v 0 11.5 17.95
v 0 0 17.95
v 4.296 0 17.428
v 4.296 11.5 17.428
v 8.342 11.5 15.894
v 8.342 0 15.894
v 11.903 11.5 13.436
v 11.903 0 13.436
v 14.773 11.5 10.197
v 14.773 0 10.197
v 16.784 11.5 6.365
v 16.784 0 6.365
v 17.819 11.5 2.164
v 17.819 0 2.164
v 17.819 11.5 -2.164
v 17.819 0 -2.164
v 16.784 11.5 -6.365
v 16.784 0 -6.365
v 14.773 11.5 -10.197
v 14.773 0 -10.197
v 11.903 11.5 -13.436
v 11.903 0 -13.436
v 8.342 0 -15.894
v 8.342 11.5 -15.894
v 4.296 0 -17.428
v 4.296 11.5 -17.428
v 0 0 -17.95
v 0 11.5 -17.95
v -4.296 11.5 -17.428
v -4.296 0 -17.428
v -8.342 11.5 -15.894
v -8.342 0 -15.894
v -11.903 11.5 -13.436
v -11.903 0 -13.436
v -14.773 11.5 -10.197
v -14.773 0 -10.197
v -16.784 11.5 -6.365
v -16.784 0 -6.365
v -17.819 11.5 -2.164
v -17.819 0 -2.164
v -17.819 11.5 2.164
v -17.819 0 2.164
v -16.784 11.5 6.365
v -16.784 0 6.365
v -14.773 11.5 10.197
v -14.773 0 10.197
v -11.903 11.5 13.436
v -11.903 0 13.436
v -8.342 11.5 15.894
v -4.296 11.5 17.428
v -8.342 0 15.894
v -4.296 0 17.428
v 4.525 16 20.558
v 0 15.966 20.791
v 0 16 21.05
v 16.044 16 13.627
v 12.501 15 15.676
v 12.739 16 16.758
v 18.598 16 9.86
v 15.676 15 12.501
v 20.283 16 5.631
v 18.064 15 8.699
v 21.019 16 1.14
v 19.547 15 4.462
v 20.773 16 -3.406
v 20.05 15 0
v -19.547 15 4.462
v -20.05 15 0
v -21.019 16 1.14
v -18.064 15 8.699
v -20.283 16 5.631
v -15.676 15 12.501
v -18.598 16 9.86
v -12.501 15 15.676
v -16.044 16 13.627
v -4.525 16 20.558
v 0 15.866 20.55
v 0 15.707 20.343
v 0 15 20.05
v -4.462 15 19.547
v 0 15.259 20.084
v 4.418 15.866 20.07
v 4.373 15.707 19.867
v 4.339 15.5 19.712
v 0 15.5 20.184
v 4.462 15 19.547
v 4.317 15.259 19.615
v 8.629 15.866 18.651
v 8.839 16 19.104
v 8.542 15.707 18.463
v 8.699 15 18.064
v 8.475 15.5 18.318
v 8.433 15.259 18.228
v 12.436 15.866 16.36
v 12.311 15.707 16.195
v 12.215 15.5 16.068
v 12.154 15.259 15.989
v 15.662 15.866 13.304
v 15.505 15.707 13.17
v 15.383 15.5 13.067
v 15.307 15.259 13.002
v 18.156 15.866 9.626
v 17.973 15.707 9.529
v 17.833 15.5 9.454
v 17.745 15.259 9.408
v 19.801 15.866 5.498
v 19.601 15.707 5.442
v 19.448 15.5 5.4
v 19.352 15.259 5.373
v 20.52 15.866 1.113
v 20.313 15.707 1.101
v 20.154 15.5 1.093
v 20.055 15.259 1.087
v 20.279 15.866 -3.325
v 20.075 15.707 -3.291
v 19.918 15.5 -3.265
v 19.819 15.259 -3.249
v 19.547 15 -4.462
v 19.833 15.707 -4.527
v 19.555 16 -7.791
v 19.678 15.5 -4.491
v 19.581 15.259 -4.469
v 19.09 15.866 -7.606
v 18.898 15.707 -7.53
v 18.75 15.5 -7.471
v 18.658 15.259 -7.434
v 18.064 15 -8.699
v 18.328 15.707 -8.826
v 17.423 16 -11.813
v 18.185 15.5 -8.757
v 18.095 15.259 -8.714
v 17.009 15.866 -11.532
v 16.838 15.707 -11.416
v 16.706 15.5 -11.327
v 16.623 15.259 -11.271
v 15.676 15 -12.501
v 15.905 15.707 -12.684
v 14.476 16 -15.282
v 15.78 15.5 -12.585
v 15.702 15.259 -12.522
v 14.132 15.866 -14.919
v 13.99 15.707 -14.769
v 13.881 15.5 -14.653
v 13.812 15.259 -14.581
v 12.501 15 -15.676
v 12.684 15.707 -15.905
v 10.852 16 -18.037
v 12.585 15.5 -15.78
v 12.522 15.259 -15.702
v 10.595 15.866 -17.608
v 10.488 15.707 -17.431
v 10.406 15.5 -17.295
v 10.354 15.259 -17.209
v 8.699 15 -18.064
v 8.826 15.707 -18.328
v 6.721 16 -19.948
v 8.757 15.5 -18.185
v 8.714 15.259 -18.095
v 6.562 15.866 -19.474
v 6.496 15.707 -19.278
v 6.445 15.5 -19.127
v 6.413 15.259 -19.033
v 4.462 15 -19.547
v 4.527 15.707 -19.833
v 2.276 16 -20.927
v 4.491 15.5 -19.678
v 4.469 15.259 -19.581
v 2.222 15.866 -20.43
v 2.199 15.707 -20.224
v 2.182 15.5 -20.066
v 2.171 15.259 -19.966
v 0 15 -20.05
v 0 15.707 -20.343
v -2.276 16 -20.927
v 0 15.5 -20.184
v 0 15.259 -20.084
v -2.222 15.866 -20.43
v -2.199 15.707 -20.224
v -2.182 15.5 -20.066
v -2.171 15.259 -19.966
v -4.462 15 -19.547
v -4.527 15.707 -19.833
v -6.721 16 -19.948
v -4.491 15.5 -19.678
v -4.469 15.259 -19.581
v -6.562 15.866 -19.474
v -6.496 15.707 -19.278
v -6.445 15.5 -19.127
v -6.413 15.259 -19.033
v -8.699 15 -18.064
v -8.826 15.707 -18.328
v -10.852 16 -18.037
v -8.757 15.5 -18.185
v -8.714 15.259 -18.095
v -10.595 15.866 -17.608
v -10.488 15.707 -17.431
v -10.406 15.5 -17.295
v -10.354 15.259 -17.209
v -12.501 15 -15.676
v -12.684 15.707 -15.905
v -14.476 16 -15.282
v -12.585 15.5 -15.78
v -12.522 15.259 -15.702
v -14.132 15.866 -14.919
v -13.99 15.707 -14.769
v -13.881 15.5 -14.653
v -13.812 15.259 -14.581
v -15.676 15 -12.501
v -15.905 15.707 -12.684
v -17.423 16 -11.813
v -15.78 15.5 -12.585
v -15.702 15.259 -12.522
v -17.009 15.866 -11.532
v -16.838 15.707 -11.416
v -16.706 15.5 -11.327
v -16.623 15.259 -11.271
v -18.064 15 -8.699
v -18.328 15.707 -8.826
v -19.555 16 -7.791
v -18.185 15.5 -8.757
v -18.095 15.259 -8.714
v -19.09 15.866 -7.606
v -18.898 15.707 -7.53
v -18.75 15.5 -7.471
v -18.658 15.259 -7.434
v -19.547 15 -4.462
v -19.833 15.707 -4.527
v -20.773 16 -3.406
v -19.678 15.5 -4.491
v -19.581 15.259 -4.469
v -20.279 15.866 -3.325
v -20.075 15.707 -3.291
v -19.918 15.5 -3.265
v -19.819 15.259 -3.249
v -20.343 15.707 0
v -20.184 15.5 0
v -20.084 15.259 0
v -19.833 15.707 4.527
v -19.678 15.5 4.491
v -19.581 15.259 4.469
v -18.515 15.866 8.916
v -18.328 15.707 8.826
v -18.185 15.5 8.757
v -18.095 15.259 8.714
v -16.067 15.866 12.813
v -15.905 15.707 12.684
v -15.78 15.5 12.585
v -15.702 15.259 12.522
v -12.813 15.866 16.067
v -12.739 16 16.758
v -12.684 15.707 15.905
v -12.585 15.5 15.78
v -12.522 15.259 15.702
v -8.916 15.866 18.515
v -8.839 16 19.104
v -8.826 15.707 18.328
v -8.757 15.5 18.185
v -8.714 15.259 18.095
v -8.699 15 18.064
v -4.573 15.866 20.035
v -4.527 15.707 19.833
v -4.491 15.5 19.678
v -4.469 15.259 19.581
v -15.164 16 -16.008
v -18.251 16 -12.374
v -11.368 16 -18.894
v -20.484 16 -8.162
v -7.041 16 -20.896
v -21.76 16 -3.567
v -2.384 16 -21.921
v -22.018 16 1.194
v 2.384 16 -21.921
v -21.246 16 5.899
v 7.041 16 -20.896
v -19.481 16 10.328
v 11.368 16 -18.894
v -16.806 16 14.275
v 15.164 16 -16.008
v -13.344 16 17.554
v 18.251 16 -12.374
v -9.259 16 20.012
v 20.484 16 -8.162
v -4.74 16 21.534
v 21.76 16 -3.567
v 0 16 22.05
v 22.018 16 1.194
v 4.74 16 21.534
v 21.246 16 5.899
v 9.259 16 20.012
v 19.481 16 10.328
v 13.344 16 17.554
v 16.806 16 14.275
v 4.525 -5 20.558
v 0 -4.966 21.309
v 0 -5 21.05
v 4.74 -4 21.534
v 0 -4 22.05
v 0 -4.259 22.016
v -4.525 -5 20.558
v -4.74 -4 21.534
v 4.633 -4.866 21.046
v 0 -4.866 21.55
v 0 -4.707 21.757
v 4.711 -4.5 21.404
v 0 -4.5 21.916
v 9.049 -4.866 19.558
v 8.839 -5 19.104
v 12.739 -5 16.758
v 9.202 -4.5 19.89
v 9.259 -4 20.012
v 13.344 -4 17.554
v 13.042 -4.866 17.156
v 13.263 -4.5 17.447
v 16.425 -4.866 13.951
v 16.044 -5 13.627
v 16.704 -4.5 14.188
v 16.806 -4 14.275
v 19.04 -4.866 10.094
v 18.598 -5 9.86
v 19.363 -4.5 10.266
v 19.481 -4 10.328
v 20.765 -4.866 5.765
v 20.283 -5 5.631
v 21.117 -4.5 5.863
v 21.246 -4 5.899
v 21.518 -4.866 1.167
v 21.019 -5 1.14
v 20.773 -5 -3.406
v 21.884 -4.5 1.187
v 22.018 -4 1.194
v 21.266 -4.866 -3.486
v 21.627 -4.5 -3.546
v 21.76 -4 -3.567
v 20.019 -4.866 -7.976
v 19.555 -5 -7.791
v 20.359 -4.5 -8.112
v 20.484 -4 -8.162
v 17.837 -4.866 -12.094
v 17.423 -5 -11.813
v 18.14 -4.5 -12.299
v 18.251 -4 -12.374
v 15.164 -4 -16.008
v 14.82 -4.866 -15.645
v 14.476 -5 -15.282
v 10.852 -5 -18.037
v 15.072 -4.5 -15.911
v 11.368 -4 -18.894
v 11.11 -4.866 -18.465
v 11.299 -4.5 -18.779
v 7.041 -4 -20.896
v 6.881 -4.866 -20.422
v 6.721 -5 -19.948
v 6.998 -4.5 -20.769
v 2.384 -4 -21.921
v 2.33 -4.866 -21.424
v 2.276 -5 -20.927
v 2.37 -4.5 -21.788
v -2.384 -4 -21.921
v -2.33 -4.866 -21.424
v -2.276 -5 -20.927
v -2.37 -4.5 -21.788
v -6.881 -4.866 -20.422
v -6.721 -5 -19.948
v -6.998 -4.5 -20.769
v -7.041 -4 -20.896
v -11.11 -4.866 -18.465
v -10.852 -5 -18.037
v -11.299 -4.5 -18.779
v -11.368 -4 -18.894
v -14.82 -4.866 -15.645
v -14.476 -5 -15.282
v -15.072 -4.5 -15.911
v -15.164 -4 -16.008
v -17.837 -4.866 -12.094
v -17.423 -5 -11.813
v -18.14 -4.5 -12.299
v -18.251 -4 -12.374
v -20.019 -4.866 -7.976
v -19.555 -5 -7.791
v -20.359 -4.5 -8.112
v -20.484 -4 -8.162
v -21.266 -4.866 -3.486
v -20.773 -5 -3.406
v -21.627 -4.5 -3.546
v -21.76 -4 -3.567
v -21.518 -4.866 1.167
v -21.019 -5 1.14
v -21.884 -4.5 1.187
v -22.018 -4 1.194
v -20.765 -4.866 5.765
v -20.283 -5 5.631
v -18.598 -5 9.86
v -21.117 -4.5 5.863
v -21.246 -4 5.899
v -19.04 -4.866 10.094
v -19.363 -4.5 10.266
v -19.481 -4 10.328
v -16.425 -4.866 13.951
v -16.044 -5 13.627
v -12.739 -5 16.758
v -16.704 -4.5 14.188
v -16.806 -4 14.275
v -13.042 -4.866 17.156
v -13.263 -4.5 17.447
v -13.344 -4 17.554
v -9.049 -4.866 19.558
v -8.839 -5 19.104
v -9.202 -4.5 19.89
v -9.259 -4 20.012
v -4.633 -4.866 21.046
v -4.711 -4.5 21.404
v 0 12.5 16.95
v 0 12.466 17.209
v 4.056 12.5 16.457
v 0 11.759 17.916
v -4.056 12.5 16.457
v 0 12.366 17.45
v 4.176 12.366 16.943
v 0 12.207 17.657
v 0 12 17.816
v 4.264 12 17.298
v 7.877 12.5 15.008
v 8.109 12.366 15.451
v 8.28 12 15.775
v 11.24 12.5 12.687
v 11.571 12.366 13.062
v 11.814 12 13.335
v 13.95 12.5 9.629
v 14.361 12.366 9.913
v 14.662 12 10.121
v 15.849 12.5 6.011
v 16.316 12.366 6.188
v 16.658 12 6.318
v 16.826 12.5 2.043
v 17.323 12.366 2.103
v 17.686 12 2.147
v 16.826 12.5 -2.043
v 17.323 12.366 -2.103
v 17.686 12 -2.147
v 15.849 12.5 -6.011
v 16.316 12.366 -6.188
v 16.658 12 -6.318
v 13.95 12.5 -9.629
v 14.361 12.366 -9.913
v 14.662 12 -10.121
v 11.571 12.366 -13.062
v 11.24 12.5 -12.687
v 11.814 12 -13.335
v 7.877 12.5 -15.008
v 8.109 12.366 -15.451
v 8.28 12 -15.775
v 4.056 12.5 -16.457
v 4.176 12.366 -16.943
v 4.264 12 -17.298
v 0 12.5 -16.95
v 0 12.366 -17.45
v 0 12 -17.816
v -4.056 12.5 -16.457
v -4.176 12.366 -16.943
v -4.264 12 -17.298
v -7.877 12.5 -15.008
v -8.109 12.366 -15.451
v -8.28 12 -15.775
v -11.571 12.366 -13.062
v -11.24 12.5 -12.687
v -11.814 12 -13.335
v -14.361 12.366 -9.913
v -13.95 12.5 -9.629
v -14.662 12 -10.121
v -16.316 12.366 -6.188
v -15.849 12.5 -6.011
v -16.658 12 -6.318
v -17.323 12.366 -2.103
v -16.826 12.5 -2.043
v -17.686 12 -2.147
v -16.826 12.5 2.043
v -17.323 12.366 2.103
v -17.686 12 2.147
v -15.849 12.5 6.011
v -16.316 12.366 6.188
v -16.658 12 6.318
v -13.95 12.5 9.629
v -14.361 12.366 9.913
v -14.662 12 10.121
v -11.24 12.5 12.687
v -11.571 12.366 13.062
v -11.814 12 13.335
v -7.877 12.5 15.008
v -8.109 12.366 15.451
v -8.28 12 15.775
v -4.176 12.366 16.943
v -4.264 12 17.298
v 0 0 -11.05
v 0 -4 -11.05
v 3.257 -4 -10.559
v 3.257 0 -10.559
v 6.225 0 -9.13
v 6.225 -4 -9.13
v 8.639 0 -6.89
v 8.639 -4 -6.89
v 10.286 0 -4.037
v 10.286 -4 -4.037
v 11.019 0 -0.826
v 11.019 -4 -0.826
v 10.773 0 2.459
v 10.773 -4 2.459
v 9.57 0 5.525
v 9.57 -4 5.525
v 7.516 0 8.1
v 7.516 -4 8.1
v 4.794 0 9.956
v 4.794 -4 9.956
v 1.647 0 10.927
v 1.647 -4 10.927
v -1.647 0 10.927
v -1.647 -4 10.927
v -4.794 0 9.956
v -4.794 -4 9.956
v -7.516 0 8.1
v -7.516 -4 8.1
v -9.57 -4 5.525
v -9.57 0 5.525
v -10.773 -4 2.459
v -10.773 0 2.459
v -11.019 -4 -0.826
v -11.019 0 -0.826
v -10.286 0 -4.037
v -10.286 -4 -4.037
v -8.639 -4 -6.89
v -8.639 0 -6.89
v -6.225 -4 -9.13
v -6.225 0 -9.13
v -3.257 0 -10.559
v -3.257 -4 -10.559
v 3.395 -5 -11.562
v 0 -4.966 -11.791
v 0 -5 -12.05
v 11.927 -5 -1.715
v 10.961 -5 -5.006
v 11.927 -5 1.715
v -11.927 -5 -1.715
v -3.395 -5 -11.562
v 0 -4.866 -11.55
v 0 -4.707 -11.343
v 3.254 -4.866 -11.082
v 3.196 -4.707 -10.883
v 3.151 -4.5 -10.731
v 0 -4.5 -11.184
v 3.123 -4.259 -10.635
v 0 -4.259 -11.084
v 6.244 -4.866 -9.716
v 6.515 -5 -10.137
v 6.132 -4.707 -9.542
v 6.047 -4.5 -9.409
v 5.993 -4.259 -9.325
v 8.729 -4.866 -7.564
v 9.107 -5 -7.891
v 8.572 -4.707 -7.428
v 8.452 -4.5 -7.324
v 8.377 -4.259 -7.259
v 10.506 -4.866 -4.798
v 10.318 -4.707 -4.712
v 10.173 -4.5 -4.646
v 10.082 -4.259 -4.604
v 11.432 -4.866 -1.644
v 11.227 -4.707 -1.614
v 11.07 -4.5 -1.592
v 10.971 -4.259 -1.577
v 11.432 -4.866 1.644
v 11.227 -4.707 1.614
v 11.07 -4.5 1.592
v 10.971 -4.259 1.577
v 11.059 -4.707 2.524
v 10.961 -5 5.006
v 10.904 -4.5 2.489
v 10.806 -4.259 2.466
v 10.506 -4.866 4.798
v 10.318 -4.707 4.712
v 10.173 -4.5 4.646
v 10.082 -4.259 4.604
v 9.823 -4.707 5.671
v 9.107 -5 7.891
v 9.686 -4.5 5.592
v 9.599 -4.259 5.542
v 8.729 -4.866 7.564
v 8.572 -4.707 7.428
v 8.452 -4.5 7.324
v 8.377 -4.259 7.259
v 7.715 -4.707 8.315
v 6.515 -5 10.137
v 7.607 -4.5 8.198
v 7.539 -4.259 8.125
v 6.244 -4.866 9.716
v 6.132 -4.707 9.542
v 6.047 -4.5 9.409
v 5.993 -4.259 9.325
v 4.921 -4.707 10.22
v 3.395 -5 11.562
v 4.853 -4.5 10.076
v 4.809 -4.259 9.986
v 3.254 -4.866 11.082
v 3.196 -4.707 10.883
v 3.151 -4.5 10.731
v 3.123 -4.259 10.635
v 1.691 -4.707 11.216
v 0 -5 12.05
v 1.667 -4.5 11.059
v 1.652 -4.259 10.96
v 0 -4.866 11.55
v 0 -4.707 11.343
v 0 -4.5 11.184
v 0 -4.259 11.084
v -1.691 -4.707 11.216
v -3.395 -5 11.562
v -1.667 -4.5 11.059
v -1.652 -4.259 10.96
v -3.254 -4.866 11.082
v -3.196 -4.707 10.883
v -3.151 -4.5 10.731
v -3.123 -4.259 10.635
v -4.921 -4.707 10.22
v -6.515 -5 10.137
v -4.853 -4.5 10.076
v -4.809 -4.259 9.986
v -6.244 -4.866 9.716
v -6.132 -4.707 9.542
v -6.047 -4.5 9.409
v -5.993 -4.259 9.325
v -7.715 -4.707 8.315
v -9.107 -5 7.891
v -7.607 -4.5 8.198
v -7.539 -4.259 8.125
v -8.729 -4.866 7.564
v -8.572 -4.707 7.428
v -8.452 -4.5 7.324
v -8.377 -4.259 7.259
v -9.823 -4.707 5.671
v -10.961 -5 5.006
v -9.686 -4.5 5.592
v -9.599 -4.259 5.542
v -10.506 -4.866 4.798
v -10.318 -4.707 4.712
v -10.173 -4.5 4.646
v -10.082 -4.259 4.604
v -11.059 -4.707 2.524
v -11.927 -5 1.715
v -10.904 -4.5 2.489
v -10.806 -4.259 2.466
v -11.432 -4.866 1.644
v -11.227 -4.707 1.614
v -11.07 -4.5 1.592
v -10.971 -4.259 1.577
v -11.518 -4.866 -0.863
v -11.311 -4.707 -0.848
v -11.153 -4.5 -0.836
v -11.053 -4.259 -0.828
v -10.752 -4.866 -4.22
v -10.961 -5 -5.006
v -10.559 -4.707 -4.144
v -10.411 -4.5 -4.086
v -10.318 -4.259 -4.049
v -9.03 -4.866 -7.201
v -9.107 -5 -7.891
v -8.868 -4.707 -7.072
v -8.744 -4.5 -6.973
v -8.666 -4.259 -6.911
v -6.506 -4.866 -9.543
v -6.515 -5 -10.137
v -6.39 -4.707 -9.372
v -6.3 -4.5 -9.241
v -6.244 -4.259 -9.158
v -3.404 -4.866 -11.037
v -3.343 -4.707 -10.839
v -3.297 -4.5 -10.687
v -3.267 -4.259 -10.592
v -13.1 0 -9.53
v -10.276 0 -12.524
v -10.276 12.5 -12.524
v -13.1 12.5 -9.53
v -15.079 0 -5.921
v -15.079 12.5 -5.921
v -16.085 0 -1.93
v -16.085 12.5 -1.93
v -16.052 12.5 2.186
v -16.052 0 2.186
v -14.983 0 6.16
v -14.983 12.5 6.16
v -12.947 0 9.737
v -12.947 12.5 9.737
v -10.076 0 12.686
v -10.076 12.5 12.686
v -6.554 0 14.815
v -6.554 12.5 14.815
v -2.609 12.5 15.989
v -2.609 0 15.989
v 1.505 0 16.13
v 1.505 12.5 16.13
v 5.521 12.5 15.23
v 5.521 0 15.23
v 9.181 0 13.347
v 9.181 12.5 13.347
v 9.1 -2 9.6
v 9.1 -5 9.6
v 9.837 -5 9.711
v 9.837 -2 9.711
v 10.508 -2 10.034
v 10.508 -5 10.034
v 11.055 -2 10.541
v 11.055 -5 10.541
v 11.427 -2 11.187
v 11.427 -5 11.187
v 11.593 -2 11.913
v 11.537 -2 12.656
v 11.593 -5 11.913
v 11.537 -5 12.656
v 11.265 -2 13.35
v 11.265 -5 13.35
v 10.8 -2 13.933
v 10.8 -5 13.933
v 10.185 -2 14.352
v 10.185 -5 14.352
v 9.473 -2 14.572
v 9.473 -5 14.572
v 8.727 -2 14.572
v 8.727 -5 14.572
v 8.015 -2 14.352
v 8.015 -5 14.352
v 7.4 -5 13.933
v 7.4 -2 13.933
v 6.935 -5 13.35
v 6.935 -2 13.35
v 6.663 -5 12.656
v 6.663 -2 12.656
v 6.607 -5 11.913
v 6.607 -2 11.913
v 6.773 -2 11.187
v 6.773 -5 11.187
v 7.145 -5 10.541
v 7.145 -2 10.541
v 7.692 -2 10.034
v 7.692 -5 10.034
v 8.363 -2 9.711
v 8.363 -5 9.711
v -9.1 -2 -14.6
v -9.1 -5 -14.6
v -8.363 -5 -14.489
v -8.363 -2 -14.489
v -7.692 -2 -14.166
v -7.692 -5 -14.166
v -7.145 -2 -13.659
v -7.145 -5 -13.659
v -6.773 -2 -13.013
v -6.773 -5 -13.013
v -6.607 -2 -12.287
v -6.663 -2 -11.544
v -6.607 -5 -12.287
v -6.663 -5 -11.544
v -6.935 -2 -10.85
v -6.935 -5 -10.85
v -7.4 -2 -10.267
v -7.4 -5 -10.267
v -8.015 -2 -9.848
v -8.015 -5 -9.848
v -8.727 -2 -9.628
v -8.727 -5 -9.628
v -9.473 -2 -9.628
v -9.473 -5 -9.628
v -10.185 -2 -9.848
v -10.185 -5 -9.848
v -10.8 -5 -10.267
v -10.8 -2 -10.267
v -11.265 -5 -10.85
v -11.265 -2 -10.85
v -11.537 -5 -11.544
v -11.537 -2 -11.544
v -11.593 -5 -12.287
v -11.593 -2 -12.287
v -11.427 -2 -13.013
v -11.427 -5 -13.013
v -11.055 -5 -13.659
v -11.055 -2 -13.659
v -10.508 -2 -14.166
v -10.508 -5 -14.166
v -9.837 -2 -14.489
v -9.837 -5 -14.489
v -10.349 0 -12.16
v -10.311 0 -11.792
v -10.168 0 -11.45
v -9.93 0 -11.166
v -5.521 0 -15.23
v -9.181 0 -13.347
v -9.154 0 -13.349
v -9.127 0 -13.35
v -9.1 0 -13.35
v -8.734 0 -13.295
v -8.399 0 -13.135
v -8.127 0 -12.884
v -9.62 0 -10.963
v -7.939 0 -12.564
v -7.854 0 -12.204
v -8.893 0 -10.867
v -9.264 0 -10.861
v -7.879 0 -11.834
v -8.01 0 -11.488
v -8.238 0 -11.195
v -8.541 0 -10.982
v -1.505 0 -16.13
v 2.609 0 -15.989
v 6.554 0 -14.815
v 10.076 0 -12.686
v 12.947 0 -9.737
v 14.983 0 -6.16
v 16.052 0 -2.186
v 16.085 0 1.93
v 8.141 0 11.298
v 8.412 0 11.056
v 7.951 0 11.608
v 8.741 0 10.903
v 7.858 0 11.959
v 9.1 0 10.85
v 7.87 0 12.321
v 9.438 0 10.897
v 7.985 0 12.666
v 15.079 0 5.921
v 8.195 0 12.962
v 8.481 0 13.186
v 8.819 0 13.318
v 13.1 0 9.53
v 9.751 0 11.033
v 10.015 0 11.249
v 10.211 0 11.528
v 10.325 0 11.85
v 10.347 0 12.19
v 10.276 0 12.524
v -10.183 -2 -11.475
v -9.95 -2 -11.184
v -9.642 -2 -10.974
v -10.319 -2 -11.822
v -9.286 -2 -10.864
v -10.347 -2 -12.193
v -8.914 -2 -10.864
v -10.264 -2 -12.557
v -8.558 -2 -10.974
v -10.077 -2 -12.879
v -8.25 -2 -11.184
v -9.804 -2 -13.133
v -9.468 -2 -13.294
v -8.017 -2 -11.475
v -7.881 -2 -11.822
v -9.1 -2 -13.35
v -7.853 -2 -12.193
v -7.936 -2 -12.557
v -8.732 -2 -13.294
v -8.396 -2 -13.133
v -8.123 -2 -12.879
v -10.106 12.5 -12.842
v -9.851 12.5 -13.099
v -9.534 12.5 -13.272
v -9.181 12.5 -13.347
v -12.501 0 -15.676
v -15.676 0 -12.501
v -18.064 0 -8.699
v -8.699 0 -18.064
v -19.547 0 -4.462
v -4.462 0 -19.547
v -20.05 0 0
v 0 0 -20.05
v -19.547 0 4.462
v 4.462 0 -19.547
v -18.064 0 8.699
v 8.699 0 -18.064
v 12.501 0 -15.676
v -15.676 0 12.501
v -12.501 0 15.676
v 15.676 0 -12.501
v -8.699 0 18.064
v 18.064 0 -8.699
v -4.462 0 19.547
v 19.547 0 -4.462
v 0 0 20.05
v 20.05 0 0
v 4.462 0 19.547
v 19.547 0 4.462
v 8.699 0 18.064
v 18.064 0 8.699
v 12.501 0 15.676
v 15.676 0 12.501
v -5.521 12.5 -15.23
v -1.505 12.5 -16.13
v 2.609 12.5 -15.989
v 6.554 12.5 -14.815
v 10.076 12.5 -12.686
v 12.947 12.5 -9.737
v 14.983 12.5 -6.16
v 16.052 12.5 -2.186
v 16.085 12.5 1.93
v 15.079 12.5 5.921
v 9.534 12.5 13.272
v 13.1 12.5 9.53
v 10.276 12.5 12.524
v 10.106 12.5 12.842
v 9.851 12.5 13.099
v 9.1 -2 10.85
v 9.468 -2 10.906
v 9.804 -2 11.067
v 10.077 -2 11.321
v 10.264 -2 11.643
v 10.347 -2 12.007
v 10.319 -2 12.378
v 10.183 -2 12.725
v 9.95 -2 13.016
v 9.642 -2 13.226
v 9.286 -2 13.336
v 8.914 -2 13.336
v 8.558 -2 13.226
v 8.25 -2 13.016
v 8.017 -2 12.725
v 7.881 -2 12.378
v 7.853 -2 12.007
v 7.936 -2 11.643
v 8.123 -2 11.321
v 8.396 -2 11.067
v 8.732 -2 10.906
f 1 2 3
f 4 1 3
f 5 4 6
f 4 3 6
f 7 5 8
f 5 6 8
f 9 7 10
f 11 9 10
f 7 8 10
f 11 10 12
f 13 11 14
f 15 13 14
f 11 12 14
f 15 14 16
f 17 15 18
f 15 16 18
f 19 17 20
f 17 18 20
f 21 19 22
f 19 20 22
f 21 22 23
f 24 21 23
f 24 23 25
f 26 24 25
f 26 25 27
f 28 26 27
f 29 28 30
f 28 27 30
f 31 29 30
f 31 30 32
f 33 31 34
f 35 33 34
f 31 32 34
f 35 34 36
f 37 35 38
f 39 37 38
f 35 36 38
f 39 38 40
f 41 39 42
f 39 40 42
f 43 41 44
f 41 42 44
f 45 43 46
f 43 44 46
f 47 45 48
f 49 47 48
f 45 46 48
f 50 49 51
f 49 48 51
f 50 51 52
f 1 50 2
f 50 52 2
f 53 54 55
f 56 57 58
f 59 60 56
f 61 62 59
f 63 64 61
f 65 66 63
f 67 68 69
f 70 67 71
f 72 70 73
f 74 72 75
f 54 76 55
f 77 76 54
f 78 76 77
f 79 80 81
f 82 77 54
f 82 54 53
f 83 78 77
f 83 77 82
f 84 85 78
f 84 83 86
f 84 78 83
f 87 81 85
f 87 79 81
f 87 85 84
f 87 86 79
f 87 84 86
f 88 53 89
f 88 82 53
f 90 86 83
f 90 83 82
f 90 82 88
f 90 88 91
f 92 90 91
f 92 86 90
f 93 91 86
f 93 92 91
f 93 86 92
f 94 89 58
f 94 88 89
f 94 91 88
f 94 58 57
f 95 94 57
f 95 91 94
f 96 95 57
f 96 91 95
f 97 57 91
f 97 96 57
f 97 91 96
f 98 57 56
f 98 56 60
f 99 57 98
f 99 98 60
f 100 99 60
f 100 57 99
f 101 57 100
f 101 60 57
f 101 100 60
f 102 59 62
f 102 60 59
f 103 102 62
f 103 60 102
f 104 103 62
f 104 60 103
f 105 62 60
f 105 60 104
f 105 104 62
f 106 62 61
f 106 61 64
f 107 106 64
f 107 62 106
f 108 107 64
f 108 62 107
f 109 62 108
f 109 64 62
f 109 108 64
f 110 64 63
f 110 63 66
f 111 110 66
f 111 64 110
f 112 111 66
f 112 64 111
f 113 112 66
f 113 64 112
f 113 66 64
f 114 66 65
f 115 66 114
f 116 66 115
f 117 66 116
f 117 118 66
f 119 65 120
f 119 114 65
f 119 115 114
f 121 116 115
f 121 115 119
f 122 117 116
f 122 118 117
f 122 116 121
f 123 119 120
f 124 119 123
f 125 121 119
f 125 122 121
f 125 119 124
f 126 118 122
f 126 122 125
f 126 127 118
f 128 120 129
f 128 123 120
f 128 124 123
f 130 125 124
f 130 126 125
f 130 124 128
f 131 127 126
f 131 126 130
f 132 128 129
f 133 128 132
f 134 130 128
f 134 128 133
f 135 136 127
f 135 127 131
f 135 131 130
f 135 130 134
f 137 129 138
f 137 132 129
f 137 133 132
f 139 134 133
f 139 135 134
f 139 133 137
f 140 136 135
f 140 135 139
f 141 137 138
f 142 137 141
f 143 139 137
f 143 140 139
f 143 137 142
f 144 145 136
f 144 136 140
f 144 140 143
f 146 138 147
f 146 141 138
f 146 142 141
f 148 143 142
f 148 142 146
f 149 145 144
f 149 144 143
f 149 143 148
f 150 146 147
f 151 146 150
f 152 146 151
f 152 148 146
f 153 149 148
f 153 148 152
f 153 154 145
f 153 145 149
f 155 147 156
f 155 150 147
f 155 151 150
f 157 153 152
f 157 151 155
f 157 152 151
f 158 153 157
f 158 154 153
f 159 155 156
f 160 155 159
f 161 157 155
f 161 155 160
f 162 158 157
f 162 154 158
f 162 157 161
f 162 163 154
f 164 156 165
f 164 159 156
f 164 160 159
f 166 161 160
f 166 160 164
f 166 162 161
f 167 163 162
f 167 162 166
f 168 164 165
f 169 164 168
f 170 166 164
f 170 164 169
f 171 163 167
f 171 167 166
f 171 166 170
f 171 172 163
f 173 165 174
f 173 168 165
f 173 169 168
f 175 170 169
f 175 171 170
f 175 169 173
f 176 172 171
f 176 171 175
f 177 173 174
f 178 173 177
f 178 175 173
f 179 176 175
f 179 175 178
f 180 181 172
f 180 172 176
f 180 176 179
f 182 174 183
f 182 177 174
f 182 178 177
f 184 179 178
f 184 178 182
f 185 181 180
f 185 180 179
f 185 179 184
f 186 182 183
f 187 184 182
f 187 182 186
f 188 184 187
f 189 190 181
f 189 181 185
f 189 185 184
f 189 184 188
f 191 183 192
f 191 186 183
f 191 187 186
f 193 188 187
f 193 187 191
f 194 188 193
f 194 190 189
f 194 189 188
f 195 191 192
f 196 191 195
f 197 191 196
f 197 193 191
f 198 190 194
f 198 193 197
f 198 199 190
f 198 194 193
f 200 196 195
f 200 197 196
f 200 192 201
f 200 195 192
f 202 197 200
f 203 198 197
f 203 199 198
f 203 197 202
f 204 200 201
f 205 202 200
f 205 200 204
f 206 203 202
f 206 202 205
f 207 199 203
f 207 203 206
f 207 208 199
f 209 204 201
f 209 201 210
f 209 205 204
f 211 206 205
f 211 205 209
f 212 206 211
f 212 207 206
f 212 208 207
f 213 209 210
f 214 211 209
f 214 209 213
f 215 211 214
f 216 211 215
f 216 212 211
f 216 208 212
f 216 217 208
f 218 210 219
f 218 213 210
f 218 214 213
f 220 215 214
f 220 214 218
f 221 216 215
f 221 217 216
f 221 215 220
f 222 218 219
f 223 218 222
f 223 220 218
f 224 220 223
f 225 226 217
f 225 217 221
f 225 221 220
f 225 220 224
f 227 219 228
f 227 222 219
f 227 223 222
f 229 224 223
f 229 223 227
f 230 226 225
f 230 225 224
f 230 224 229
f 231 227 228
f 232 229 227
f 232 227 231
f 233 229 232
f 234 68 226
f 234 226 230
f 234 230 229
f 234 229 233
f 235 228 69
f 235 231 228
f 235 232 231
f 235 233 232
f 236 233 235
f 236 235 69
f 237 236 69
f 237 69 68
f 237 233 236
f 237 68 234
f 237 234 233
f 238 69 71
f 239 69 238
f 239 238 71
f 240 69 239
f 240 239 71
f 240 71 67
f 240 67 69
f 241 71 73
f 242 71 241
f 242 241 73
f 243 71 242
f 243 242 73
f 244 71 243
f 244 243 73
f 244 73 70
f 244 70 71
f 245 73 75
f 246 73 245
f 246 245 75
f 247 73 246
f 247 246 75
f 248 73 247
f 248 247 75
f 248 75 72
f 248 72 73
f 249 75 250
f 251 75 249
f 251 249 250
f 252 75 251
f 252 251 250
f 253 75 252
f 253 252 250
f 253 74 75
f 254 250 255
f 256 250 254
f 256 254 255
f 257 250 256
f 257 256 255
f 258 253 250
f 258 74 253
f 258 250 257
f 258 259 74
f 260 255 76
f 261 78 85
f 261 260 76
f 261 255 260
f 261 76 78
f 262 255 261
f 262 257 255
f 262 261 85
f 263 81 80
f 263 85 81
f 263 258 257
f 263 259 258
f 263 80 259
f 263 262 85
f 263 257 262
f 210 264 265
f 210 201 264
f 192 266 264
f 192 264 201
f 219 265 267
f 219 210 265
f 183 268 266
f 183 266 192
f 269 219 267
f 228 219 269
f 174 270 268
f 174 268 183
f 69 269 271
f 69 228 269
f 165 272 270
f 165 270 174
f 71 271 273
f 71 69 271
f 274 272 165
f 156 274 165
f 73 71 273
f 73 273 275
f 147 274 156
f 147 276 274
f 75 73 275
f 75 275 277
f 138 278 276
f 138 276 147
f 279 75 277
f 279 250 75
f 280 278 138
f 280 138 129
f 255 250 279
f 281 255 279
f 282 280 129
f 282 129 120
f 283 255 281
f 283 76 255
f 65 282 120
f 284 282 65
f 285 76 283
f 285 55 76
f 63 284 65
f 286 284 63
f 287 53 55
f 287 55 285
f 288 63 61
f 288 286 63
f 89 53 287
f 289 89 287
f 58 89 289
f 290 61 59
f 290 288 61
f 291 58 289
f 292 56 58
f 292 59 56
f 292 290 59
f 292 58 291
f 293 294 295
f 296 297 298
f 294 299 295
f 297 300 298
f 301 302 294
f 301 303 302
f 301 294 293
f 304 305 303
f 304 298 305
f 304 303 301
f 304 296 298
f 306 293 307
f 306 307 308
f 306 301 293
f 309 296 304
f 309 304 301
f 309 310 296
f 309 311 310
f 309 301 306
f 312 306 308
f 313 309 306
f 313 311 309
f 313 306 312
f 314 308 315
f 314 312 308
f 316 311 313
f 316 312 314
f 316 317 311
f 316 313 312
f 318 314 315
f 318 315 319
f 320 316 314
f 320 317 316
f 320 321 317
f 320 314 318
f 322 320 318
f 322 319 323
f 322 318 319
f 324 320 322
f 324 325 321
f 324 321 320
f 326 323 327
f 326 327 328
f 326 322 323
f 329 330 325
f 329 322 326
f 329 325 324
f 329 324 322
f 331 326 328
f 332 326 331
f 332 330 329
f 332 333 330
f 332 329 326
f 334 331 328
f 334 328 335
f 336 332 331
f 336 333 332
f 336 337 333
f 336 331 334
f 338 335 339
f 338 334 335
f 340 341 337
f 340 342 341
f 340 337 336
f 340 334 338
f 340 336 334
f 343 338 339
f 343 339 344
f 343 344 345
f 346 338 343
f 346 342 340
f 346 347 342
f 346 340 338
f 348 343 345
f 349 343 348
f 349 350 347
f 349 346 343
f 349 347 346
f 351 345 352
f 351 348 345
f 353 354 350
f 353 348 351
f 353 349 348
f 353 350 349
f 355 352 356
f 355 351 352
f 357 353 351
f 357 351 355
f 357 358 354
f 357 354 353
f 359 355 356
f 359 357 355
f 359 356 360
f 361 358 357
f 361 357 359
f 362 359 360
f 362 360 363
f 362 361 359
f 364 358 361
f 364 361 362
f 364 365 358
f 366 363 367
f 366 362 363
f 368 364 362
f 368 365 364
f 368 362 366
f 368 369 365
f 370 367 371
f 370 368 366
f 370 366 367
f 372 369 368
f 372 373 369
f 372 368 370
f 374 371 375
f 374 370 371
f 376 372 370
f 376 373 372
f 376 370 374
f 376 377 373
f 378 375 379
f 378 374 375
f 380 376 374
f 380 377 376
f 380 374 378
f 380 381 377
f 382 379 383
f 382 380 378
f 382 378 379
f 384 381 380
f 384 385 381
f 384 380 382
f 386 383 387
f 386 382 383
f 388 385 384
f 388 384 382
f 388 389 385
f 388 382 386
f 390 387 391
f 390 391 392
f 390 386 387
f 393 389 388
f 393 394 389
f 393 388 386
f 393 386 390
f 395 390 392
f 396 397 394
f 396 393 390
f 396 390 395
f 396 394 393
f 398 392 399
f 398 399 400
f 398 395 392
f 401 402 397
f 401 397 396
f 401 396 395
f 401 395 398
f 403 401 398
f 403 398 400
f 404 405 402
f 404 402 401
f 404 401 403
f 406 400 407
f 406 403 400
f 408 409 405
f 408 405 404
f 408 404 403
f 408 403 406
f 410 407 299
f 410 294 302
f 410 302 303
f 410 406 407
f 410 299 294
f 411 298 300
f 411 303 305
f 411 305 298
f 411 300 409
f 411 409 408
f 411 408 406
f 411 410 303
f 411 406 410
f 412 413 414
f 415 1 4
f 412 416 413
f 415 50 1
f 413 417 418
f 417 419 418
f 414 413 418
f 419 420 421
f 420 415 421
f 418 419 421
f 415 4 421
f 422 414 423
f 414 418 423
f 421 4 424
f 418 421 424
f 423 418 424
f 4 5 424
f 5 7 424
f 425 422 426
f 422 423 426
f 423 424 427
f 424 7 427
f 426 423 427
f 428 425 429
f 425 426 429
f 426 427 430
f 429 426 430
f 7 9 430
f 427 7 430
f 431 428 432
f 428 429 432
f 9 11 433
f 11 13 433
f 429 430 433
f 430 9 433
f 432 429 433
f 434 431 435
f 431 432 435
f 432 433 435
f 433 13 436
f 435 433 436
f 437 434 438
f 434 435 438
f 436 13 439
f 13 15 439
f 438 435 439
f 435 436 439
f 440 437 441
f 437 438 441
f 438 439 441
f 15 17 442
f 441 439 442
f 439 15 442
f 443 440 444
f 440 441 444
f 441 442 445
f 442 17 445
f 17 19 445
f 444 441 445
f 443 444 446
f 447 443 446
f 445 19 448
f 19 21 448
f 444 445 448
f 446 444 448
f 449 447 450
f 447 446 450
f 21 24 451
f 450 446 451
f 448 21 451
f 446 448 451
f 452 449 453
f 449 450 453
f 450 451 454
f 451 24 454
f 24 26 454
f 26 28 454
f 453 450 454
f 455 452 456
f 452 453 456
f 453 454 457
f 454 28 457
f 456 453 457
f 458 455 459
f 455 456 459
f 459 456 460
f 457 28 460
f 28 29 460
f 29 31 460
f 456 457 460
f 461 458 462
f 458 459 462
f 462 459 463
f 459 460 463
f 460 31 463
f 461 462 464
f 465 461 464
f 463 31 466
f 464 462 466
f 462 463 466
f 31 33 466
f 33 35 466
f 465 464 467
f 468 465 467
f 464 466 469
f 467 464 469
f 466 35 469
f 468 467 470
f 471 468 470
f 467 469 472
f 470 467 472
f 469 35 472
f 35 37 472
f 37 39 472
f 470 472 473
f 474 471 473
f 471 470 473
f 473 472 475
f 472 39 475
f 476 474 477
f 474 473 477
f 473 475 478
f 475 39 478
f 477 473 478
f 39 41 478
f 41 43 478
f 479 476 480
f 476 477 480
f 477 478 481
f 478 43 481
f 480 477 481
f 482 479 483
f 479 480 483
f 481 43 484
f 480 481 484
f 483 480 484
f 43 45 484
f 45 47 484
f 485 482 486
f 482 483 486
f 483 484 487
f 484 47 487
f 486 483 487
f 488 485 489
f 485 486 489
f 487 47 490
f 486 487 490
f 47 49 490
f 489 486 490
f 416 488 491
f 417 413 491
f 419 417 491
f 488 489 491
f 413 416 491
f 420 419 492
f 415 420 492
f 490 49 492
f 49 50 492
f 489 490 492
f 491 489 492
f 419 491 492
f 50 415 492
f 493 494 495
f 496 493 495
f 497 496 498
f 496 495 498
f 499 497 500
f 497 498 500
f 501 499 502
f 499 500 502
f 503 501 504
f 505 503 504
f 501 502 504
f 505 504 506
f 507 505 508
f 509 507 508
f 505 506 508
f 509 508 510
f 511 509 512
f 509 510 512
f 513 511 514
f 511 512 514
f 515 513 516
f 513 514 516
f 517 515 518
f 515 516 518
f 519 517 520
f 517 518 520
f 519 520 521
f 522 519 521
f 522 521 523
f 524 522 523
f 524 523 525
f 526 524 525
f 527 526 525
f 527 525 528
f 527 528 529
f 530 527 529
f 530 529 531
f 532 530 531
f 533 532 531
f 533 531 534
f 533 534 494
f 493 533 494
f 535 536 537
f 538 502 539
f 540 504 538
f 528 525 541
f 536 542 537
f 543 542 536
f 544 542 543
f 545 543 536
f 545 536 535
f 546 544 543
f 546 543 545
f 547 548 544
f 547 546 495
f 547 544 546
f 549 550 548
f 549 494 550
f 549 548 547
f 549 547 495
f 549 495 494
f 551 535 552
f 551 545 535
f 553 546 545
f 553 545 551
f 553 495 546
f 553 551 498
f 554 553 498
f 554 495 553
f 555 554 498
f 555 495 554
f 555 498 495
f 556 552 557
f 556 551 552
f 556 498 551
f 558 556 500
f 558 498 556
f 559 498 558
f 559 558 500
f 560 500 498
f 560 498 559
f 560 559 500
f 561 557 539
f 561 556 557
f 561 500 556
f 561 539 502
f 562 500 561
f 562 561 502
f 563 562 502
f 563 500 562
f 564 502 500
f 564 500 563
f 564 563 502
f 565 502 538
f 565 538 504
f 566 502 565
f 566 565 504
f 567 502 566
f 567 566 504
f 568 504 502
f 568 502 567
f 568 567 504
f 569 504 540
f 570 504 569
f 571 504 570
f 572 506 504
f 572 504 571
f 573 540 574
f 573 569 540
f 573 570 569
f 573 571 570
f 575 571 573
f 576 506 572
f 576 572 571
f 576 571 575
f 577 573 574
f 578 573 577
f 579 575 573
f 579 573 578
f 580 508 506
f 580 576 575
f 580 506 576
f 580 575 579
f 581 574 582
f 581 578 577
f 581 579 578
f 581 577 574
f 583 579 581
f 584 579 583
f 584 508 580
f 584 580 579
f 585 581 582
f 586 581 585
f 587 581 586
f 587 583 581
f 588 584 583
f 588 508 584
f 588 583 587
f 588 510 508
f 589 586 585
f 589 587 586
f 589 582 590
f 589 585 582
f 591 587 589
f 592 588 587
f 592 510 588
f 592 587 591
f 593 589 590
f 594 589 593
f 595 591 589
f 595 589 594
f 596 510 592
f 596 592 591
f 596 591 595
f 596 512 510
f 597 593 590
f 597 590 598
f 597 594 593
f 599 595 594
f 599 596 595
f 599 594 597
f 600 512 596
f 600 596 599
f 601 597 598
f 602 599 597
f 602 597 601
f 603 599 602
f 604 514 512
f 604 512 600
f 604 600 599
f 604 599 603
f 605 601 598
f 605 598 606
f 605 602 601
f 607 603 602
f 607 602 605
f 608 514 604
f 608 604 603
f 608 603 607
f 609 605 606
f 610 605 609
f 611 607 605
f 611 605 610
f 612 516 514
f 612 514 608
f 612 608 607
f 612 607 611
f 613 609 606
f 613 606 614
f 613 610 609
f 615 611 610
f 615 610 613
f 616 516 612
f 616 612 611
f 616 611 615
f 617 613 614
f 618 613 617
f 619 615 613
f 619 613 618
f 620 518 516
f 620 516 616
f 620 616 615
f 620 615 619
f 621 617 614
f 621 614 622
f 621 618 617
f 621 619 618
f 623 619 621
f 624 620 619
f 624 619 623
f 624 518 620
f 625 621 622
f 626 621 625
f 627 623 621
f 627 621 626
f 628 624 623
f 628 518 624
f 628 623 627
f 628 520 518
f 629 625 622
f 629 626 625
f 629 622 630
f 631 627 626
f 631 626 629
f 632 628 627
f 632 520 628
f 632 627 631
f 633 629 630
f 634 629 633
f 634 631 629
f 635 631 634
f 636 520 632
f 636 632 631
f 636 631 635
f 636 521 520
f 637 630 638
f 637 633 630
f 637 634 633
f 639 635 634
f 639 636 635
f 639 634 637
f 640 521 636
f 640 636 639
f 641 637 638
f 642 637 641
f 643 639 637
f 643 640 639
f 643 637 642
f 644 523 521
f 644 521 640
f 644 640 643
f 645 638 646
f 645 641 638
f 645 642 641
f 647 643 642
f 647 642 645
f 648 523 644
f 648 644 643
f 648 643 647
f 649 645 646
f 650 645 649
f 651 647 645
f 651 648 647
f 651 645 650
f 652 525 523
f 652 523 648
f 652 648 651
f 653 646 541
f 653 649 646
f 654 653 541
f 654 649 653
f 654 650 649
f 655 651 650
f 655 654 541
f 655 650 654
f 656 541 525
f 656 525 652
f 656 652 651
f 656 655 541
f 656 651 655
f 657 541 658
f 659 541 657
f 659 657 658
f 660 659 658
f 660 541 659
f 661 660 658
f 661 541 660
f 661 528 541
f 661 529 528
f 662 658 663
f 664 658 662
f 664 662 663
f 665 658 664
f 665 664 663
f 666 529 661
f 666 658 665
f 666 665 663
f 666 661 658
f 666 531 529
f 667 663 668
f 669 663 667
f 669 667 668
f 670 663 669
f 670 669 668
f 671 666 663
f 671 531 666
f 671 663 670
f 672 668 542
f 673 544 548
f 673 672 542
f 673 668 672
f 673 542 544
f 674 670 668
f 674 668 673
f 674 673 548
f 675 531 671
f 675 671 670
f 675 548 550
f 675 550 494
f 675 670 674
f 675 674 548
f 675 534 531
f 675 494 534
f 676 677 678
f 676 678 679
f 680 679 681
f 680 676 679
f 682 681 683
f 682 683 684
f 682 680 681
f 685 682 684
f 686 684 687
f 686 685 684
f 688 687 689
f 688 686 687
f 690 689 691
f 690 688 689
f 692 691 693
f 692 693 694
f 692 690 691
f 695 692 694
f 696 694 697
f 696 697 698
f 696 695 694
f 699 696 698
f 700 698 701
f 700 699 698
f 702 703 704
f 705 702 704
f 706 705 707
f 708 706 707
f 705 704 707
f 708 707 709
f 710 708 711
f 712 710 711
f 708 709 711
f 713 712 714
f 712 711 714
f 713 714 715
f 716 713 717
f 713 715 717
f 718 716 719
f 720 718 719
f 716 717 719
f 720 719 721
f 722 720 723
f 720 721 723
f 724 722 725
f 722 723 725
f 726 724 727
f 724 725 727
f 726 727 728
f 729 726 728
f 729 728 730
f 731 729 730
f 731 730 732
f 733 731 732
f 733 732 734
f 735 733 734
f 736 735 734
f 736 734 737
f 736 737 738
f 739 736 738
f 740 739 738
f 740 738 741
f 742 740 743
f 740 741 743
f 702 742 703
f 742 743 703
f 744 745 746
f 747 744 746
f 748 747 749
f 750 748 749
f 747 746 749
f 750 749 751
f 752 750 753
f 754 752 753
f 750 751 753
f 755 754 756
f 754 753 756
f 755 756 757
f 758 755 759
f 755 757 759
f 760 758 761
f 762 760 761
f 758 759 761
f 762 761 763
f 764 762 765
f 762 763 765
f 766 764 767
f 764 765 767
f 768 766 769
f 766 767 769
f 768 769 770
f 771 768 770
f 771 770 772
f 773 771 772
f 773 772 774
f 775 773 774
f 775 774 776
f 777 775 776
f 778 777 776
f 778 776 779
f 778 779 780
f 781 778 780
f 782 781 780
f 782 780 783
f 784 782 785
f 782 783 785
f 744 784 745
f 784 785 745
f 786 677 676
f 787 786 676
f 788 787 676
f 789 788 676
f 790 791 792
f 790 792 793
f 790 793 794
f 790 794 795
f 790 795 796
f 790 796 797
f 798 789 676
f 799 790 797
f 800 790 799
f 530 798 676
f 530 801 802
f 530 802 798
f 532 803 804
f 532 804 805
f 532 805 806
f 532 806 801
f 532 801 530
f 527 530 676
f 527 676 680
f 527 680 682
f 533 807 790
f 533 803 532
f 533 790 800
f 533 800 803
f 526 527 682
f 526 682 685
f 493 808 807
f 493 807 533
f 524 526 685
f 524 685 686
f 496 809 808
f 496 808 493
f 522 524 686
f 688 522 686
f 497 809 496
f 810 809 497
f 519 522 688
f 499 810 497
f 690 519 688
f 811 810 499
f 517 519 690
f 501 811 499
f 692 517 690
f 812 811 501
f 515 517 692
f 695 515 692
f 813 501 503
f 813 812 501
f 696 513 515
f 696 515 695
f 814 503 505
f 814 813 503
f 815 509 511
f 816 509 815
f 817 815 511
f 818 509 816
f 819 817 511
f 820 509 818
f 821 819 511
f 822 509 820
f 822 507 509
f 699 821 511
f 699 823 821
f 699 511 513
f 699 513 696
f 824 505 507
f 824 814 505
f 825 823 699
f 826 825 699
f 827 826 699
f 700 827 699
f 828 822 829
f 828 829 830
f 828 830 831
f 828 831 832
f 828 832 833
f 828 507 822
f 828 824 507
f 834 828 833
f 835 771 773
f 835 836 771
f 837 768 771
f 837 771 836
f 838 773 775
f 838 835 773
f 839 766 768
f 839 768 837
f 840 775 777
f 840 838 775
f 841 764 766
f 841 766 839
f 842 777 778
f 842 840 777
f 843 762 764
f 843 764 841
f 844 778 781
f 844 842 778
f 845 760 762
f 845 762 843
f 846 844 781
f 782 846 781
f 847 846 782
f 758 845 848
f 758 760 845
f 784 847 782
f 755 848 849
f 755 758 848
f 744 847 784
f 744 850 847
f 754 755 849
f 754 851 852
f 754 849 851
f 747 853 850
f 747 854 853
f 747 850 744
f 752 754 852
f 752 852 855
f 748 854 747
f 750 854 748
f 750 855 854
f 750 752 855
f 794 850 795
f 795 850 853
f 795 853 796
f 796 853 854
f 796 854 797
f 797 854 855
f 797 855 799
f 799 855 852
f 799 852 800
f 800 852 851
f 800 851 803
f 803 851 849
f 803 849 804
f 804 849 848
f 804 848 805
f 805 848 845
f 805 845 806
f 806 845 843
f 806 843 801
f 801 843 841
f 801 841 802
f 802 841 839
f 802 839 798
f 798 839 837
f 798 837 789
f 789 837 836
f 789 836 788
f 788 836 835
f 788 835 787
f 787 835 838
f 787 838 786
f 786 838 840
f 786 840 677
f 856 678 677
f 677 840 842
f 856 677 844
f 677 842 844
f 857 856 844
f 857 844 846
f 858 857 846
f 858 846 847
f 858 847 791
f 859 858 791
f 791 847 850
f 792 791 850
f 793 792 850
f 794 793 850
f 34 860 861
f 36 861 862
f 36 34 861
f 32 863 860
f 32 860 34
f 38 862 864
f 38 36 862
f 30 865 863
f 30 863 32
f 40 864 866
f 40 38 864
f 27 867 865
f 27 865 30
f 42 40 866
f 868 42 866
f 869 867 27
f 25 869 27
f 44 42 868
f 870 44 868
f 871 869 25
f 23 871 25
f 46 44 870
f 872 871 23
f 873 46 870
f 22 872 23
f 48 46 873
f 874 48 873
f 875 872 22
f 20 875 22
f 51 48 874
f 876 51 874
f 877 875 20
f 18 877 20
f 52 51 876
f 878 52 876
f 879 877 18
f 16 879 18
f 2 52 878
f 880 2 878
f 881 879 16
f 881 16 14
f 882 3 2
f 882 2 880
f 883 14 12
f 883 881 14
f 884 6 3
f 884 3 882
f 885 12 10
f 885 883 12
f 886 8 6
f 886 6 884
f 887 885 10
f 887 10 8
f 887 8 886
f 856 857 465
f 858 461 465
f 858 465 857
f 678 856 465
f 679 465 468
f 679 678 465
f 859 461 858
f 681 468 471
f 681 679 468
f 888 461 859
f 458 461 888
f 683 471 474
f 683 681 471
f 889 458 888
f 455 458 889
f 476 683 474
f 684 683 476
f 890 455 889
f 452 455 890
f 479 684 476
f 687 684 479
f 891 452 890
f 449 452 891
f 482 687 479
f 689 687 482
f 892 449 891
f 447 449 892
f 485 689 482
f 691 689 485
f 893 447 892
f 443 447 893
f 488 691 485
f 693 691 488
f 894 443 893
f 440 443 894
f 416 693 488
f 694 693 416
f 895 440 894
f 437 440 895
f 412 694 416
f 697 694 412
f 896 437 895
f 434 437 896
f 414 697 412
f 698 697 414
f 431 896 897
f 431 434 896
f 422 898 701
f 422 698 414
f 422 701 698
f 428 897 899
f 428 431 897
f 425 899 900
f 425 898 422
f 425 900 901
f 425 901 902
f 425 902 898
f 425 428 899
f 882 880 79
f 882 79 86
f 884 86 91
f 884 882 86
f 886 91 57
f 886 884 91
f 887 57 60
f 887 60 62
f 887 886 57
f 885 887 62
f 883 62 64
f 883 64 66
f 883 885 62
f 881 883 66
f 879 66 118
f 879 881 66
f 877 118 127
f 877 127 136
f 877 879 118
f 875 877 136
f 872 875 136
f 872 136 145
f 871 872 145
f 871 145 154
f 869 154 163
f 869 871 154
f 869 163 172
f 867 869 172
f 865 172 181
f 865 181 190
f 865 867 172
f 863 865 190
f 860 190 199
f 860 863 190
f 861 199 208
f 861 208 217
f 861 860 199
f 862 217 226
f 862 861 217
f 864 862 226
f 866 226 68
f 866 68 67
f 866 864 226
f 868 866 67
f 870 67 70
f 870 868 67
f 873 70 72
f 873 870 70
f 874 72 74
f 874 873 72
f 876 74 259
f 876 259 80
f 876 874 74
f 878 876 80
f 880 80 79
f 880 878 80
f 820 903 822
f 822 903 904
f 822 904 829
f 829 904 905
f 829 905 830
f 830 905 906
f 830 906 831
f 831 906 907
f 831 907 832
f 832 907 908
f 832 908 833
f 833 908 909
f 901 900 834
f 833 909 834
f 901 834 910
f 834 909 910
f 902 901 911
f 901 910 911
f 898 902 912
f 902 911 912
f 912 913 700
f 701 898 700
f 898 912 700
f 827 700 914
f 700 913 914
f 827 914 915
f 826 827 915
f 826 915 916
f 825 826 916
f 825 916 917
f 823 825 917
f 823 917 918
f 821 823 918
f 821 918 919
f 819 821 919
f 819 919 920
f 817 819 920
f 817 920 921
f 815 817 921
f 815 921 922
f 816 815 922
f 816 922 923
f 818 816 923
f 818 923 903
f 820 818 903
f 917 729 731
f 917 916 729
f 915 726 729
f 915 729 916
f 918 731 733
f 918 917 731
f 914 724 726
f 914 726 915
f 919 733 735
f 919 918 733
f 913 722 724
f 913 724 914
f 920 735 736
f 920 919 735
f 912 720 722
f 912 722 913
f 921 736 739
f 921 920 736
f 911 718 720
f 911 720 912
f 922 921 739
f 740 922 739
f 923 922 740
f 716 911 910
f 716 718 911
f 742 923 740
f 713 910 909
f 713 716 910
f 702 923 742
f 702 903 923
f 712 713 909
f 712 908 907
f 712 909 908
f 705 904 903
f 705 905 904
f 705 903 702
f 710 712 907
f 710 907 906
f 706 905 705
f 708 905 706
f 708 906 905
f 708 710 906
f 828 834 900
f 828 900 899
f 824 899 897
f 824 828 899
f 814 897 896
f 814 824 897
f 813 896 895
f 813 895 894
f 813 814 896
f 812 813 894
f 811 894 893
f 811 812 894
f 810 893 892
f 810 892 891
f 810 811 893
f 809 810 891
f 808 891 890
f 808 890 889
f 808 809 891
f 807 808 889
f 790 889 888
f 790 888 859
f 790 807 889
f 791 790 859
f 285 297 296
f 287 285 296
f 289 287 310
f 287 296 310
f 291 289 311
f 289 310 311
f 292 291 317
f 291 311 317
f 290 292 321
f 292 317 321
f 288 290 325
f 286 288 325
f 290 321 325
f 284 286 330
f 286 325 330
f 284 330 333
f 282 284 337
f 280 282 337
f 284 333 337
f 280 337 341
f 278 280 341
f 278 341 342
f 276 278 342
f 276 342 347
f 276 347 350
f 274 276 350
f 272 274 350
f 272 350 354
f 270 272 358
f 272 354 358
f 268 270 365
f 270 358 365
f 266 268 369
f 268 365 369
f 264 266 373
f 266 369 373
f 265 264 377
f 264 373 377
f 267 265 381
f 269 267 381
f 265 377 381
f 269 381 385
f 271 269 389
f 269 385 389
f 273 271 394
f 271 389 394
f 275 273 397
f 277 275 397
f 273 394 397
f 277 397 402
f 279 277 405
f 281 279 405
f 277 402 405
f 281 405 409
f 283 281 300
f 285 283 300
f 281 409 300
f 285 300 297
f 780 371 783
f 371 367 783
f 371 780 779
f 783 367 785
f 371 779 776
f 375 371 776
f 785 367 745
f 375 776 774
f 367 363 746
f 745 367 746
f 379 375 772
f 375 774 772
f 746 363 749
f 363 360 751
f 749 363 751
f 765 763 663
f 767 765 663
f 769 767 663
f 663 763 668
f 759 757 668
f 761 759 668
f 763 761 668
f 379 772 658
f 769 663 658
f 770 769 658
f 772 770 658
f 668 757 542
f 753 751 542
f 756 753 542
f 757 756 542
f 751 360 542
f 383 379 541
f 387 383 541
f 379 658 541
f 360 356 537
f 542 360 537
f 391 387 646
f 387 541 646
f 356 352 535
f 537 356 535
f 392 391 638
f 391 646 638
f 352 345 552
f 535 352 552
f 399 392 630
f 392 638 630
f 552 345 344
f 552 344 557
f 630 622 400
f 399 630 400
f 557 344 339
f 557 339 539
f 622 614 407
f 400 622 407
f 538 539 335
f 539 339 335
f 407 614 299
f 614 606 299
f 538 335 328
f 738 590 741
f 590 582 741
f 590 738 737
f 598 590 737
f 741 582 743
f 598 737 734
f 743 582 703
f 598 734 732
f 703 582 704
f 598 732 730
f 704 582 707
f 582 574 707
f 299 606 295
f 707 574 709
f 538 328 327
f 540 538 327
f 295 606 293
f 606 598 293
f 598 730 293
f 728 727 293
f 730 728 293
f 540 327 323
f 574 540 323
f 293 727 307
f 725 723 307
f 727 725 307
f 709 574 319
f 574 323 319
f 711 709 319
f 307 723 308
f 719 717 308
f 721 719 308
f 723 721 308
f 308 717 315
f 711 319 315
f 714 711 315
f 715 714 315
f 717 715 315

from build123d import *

# Parameters (mm, degrees)
CROQUIS1_R              = 22.05
CROQUIS1_R_2            = 20.05
SALIENTE_EXTRUIR1_DEPTH = 16
CROQUIS1_4_R            = 17.95
CROQUIS1_4_R_2          = 16.2
SALIENTE_EXTRUIR2_DEPTH = 12.5
SALIENTE_EXTRUIR4_START = -5
CROQUIS1_6_R            = 22.05
SALIENTE_EXTRUIR4_DEPTH = 5
CORTAR_EXTRUIR1_REACH   = 39.595
CROQUIS4_R              = 11.05
CROQUIS4_R_2            = 1.25
CROQUIS5_R              = 2.5
CROQUIS5_R_2            = 1.25
CORTAR_EXTRUIR2_DEPTH   = 3
REDONDEO1_R             = 1
REDONDEO3_R             = 1
REDONDEO4_R             = 1


with BuildPart() as part:
    # Croquis1 → Saliente-Extruir1 (new body)
    with BuildSketch(Plane(origin=(0, 0, 0), x_dir=(1, 0, 0), z_dir=(0, 1, 0))):
        Circle(CROQUIS1_R)
        Circle(CROQUIS1_R_2, mode=Mode.SUBTRACT)
    extrude(amount=SALIENTE_EXTRUIR1_DEPTH)



with BuildPart() as body_2:
    # Croquis1<4> → Saliente-Extruir2 (new body)
    with BuildSketch(Plane(origin=(0, 0, 0), x_dir=(1, 0, 0), z_dir=(0, 1, 0))):
        Circle(CROQUIS1_4_R)
        Circle(CROQUIS1_4_R_2, mode=Mode.SUBTRACT)
    extrude(amount=SALIENTE_EXTRUIR2_DEPTH)


with BuildPart() as part_1:
    add(part.part)

    add(body_2.part)  # Saliente-Extruir4 merges body 2
    # Croquis1<6> → Saliente-Extruir4 (add)
    with BuildSketch(Plane(origin=(0, 0, 0), x_dir=(1, 0, 0), z_dir=(0, 1, 0)).offset(SALIENTE_EXTRUIR4_START)):
        Circle(CROQUIS1_6_R)
    extrude(amount=SALIENTE_EXTRUIR4_DEPTH)

    # Croquis4 → Cortar-Extruir1 (cut, up to next)
    with BuildSketch(Plane.XZ.offset(5), mode=Mode.PRIVATE) as cortar_extruir1_sk1:
        Circle(CROQUIS4_R)
    cortar_extruir1_tool1 = extrude(cortar_extruir1_sk1.sketch, amount=-CORTAR_EXTRUIR1_REACH, mode=Mode.PRIVATE) & part_1.part
    # Croquis4 → Cortar-Extruir1 (cut, up to next)
    with BuildSketch(Plane.XZ.offset(5), mode=Mode.PRIVATE) as cortar_extruir1_sk2:
        with Locations((9.1, 12.1)):
            Circle(CROQUIS4_R_2)
    cortar_extruir1_tool2 = extrude(cortar_extruir1_sk2.sketch, amount=-CORTAR_EXTRUIR1_REACH, mode=Mode.PRIVATE) & part_1.part
    # Croquis4 → Cortar-Extruir1 (cut, up to next)
    with BuildSketch(Plane.XZ.offset(5), mode=Mode.PRIVATE) as cortar_extruir1_sk3:
        with Locations((-9.1, -12.1)):
            Circle(CROQUIS4_R_2)
    cortar_extruir1_tool3 = extrude(cortar_extruir1_sk3.sketch, amount=-CORTAR_EXTRUIR1_REACH, mode=Mode.PRIVATE) & part_1.part
    add(cortar_extruir1_tool1.solids().sort_by_distance((0, -5, 0))[0], mode=Mode.SUBTRACT)
    add(cortar_extruir1_tool2.solids().sort_by_distance((9.1, -5, 12.1))[0], mode=Mode.SUBTRACT)
    add(cortar_extruir1_tool3.solids().sort_by_distance((-9.1, -5, -12.1))[0], mode=Mode.SUBTRACT)

    # Croquis5 → Cortar-Extruir2 (cut)
    # profile 1 of 2: a face of its own
    with BuildSketch(Plane.XZ.offset(5)):
        with Locations((9.1, 12.1)):
            Circle(CROQUIS5_R)
        with Locations((9.1, 12.1)):
            Circle(CROQUIS5_R_2, mode=Mode.SUBTRACT)
    # profile 2 of 2: a face of its own
    with BuildSketch(Plane.XZ.offset(5)):
        with Locations((-9.1, -12.1)):
            Circle(CROQUIS5_R)
        with Locations((-9.1, -12.1)):
            Circle(CROQUIS5_R_2, mode=Mode.SUBTRACT)
    extrude(amount=-CORTAR_EXTRUIR2_DEPTH, mode=Mode.SUBTRACT)

    # Redondeo1
    redondeo1_edges = [part_1.edges().sort_by_distance(p)[0] for p in [
        (-11.05, -5, 0),
    ]]
    fillet(redondeo1_edges, radius=REDONDEO1_R)

    # Redondeo3
    redondeo3_edges = [part_1.edges().sort_by_distance(p)[0] for p in [
        (-22.05, -5, 0),
    ]]
    fillet(redondeo3_edges, radius=REDONDEO3_R)

    # Redondeo4
    redondeo4_edges = [part_1.edges().sort_by_distance(p)[0] for p in [
        (-20.05, 16, 0),
        (-17.95, 12.5, 0),
    ]]
    fillet(redondeo4_edges, radius=REDONDEO4_R)


solid = part_1.part
